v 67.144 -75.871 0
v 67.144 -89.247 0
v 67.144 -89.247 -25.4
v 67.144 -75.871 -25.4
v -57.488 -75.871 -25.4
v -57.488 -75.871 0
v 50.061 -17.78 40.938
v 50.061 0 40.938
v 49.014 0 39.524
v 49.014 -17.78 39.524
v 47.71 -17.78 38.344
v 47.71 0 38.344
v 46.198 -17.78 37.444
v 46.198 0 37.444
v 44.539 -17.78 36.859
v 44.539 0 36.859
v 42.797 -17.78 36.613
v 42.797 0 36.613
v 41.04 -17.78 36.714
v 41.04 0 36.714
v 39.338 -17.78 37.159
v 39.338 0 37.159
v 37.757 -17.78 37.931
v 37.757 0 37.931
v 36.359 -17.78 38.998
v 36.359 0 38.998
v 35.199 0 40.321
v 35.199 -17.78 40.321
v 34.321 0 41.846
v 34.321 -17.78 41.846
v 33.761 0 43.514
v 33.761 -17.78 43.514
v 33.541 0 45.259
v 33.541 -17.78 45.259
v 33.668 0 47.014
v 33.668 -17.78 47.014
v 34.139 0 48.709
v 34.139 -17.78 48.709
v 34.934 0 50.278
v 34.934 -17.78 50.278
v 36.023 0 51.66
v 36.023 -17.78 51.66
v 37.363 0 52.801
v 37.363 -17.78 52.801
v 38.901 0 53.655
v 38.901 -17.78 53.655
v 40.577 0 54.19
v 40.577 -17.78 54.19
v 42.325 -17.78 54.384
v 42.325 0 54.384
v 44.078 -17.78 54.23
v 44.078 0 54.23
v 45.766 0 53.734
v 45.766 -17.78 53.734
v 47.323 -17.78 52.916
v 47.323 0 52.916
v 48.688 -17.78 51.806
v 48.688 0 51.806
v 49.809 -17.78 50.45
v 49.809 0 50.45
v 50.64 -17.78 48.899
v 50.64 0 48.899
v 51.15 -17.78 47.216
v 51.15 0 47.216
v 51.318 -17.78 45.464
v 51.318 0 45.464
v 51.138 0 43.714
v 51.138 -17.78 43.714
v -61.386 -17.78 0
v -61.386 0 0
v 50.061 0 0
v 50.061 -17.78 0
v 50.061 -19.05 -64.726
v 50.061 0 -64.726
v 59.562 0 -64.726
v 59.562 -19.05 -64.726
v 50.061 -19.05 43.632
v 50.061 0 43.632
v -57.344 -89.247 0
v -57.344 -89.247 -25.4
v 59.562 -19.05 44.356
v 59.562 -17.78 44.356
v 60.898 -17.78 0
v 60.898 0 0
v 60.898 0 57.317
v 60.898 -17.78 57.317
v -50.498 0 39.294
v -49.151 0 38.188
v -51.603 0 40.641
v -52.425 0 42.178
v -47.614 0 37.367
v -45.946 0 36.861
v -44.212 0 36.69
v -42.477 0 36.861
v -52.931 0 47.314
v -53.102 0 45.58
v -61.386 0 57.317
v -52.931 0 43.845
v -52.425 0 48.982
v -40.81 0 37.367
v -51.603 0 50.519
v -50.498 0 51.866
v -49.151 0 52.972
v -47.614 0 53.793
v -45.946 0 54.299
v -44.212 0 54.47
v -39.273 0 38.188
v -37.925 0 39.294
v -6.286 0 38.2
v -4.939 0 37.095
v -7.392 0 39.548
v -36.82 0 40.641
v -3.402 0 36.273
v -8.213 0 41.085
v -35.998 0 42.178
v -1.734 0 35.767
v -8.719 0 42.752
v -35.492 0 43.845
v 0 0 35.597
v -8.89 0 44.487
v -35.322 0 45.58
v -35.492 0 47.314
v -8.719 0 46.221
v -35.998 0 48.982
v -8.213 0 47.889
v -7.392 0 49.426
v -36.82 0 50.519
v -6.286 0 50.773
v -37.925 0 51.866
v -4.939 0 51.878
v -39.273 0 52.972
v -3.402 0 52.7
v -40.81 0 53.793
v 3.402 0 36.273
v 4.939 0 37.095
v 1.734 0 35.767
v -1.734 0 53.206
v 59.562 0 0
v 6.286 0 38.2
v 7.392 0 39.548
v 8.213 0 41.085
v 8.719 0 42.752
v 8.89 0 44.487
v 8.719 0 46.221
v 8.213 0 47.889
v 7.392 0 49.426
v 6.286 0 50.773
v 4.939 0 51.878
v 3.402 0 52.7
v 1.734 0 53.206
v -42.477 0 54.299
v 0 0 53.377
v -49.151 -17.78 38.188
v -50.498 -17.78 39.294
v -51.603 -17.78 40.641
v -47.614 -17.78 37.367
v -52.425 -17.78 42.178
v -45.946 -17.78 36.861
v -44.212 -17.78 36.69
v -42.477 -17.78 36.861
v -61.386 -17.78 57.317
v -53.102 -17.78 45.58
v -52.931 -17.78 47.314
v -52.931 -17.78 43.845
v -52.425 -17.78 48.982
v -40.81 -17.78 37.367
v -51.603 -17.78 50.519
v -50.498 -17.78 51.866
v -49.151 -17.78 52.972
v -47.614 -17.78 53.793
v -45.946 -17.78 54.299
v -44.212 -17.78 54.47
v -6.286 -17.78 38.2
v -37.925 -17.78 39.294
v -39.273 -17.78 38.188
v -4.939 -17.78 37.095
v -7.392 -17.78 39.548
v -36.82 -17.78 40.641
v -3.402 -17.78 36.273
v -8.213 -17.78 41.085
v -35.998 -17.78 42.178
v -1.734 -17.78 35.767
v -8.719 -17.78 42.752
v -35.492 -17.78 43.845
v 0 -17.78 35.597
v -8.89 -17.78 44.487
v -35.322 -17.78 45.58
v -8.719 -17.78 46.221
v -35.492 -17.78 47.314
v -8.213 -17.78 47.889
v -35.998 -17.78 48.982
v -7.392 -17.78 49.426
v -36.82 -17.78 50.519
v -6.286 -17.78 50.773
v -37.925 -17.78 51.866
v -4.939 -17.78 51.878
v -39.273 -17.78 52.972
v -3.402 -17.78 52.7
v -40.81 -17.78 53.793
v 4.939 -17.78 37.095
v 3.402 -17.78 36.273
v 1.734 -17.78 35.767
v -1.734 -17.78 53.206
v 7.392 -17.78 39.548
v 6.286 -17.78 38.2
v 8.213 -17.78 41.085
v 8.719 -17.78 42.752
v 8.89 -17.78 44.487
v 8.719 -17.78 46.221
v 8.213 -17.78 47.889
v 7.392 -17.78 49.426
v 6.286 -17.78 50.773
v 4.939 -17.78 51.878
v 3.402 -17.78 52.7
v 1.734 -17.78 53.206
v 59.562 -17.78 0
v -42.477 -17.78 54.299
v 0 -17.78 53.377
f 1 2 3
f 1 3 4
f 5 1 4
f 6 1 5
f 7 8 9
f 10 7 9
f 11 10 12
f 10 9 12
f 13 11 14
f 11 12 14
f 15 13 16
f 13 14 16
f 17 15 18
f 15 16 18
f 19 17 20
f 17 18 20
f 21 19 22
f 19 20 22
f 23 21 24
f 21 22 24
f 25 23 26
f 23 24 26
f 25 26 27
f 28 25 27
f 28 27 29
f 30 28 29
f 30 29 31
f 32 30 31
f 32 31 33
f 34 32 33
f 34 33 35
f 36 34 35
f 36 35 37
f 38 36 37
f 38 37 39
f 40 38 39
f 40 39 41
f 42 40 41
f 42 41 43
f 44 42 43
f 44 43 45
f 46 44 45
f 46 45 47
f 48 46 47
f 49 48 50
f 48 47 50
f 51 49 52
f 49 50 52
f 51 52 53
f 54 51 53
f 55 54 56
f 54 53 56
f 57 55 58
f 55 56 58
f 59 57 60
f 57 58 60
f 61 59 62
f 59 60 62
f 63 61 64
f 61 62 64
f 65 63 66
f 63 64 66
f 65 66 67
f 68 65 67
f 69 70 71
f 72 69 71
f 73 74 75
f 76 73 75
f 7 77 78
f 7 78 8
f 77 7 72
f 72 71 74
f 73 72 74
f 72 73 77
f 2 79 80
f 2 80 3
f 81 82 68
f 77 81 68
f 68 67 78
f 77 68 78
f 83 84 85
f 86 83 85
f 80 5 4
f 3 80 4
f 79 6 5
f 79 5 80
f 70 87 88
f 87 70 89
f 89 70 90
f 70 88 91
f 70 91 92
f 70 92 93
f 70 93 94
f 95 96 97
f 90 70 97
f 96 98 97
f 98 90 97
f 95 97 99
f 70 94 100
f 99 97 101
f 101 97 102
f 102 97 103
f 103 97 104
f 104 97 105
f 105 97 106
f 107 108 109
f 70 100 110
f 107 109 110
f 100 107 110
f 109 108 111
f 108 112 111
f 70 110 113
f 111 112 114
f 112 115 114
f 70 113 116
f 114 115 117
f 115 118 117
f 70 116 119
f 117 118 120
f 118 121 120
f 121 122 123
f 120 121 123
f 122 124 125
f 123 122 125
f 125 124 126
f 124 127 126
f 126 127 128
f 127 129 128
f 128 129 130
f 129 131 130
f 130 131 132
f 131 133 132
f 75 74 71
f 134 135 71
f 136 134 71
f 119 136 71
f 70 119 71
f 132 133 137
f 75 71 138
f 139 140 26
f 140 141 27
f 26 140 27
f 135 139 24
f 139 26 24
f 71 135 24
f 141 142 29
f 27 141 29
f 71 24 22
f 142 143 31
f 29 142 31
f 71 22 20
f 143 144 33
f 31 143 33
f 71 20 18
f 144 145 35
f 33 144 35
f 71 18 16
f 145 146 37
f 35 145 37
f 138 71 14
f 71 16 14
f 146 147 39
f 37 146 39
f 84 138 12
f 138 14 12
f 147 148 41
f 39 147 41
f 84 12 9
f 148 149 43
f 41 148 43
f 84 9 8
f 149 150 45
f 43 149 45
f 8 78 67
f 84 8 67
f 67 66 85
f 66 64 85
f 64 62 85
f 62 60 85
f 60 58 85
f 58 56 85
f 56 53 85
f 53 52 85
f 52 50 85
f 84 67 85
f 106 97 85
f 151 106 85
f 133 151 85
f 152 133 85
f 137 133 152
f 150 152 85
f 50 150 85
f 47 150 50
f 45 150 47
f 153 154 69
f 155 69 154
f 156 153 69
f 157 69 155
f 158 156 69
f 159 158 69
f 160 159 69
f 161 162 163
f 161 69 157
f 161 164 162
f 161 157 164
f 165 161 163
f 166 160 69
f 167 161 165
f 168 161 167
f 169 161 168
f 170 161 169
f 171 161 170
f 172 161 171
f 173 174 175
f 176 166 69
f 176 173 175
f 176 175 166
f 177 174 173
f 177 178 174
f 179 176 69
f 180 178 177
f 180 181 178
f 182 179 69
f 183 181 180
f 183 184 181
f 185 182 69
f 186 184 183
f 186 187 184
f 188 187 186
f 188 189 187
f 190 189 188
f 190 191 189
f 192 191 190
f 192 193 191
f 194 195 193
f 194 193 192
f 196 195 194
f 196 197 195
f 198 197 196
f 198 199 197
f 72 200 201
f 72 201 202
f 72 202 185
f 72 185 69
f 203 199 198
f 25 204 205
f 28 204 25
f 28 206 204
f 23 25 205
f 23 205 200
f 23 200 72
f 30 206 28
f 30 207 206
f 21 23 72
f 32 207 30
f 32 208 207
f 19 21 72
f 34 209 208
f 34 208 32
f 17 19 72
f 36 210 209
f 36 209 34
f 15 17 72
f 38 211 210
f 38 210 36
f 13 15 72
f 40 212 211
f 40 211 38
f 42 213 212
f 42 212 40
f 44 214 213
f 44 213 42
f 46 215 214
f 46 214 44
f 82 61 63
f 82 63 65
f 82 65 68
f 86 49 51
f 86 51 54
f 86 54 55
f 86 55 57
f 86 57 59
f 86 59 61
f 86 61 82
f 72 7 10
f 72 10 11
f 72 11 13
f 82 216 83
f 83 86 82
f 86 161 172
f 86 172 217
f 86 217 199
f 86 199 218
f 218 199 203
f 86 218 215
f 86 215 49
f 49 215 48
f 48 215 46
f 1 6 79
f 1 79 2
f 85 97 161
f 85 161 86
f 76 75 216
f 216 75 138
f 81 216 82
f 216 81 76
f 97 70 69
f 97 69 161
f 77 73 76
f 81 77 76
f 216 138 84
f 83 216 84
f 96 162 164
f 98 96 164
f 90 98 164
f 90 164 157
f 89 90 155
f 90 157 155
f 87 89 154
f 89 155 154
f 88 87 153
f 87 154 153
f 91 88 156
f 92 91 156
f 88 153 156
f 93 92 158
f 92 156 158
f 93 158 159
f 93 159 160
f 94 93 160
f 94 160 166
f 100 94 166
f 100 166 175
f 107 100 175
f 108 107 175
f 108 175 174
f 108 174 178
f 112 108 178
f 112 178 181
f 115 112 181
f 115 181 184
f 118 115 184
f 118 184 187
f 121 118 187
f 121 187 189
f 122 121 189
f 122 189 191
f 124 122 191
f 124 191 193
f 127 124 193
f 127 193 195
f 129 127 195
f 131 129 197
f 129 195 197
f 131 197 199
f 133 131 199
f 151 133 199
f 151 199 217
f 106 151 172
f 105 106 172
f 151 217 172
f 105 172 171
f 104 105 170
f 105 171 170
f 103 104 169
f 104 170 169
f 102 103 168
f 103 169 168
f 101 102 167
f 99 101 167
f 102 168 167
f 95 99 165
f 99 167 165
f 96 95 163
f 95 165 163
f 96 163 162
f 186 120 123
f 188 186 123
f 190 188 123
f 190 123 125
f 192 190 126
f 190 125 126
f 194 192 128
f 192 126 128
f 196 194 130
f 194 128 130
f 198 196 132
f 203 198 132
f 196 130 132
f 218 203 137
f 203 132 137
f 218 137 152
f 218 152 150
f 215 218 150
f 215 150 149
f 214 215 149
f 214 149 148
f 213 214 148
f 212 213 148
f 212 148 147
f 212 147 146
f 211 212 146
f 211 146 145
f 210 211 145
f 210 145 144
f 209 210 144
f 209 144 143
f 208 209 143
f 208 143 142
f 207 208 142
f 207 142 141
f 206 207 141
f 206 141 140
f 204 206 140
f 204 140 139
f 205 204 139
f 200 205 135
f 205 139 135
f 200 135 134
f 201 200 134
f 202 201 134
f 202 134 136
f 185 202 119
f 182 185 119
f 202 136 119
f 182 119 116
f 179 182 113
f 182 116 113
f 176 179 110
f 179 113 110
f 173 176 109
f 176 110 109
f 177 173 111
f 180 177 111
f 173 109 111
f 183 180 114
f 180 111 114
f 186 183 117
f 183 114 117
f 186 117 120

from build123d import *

# Parameters (mm, degrees)
F2_DEPTH  = 17.78
F0_W      = 122.2848854959
F0_H      = 57.3165342212
F3_DEPTH  = 17.78
F5_D      = 17.78
F8_D      = 17.78
F10_D     = 17.78
F12_DEPTH = 25.4
F14_DEPTH = 19.05


with BuildPart() as f2:
    # F1 (on face) → F2 (new body)
    with BuildSketch(Plane.XZ):
        Polygon((60.7268549502, 56.2854819), (-60.6423653662, 56.8059794605), (-60.6423653662, 0), (60.7268549502, 0), align=None)
    extrude(amount=F2_DEPTH)

    # F0 (on Front) → F3 (join)
    with BuildSketch(Plane.XZ):
        with Locations((-0.2439823002, 28.6582671106)):
            Rectangle(F0_W, F0_H)
    extrude(amount=F3_DEPTH)

    # F5 (through all)
    with Locations(Plane(origin=(0, 0, 0), x_dir=(1, 0, 0), z_dir=(0, 1, 0))):
        with Locations((-44.2115999758, -45.5798208714)):
            Hole(F5_D / 2)

    # F8 (through all)
    with Locations(Plane.XZ.offset(17.78)):
        with Locations((0, 44.4866754115)):
            Hole(F8_D / 2)

    # F10 (through all)
    with Locations(Plane.XZ.offset(17.78)):
        with Locations((42.4278005958, 45.4948619008)):
            Hole(F10_D / 2)

    # F13 (on Front) → F14 (join)
    with BuildSketch(Plane.XZ):
        Polygon((59.5622695982, -64.7262334824), (59.5622695982, 44.3564802408), (50.0612705946, 43.6321347952), (50.0612705946, -64.7262334824), align=None)
    extrude(amount=F14_DEPTH)


with BuildPart() as f12:
    # F11 (on Top) → F12 (new body)
    with BuildSketch(Plane.XY):
        Polygon((67.1438127756, -75.8713409305), (-57.4876181781, -75.8713409305), (-57.3438629508, -89.2470777035), (67.1438127756, -89.2470777035), align=None)
    extrude(amount=-F12_DEPTH)


solid = Compound([f2.part, f12.part])
